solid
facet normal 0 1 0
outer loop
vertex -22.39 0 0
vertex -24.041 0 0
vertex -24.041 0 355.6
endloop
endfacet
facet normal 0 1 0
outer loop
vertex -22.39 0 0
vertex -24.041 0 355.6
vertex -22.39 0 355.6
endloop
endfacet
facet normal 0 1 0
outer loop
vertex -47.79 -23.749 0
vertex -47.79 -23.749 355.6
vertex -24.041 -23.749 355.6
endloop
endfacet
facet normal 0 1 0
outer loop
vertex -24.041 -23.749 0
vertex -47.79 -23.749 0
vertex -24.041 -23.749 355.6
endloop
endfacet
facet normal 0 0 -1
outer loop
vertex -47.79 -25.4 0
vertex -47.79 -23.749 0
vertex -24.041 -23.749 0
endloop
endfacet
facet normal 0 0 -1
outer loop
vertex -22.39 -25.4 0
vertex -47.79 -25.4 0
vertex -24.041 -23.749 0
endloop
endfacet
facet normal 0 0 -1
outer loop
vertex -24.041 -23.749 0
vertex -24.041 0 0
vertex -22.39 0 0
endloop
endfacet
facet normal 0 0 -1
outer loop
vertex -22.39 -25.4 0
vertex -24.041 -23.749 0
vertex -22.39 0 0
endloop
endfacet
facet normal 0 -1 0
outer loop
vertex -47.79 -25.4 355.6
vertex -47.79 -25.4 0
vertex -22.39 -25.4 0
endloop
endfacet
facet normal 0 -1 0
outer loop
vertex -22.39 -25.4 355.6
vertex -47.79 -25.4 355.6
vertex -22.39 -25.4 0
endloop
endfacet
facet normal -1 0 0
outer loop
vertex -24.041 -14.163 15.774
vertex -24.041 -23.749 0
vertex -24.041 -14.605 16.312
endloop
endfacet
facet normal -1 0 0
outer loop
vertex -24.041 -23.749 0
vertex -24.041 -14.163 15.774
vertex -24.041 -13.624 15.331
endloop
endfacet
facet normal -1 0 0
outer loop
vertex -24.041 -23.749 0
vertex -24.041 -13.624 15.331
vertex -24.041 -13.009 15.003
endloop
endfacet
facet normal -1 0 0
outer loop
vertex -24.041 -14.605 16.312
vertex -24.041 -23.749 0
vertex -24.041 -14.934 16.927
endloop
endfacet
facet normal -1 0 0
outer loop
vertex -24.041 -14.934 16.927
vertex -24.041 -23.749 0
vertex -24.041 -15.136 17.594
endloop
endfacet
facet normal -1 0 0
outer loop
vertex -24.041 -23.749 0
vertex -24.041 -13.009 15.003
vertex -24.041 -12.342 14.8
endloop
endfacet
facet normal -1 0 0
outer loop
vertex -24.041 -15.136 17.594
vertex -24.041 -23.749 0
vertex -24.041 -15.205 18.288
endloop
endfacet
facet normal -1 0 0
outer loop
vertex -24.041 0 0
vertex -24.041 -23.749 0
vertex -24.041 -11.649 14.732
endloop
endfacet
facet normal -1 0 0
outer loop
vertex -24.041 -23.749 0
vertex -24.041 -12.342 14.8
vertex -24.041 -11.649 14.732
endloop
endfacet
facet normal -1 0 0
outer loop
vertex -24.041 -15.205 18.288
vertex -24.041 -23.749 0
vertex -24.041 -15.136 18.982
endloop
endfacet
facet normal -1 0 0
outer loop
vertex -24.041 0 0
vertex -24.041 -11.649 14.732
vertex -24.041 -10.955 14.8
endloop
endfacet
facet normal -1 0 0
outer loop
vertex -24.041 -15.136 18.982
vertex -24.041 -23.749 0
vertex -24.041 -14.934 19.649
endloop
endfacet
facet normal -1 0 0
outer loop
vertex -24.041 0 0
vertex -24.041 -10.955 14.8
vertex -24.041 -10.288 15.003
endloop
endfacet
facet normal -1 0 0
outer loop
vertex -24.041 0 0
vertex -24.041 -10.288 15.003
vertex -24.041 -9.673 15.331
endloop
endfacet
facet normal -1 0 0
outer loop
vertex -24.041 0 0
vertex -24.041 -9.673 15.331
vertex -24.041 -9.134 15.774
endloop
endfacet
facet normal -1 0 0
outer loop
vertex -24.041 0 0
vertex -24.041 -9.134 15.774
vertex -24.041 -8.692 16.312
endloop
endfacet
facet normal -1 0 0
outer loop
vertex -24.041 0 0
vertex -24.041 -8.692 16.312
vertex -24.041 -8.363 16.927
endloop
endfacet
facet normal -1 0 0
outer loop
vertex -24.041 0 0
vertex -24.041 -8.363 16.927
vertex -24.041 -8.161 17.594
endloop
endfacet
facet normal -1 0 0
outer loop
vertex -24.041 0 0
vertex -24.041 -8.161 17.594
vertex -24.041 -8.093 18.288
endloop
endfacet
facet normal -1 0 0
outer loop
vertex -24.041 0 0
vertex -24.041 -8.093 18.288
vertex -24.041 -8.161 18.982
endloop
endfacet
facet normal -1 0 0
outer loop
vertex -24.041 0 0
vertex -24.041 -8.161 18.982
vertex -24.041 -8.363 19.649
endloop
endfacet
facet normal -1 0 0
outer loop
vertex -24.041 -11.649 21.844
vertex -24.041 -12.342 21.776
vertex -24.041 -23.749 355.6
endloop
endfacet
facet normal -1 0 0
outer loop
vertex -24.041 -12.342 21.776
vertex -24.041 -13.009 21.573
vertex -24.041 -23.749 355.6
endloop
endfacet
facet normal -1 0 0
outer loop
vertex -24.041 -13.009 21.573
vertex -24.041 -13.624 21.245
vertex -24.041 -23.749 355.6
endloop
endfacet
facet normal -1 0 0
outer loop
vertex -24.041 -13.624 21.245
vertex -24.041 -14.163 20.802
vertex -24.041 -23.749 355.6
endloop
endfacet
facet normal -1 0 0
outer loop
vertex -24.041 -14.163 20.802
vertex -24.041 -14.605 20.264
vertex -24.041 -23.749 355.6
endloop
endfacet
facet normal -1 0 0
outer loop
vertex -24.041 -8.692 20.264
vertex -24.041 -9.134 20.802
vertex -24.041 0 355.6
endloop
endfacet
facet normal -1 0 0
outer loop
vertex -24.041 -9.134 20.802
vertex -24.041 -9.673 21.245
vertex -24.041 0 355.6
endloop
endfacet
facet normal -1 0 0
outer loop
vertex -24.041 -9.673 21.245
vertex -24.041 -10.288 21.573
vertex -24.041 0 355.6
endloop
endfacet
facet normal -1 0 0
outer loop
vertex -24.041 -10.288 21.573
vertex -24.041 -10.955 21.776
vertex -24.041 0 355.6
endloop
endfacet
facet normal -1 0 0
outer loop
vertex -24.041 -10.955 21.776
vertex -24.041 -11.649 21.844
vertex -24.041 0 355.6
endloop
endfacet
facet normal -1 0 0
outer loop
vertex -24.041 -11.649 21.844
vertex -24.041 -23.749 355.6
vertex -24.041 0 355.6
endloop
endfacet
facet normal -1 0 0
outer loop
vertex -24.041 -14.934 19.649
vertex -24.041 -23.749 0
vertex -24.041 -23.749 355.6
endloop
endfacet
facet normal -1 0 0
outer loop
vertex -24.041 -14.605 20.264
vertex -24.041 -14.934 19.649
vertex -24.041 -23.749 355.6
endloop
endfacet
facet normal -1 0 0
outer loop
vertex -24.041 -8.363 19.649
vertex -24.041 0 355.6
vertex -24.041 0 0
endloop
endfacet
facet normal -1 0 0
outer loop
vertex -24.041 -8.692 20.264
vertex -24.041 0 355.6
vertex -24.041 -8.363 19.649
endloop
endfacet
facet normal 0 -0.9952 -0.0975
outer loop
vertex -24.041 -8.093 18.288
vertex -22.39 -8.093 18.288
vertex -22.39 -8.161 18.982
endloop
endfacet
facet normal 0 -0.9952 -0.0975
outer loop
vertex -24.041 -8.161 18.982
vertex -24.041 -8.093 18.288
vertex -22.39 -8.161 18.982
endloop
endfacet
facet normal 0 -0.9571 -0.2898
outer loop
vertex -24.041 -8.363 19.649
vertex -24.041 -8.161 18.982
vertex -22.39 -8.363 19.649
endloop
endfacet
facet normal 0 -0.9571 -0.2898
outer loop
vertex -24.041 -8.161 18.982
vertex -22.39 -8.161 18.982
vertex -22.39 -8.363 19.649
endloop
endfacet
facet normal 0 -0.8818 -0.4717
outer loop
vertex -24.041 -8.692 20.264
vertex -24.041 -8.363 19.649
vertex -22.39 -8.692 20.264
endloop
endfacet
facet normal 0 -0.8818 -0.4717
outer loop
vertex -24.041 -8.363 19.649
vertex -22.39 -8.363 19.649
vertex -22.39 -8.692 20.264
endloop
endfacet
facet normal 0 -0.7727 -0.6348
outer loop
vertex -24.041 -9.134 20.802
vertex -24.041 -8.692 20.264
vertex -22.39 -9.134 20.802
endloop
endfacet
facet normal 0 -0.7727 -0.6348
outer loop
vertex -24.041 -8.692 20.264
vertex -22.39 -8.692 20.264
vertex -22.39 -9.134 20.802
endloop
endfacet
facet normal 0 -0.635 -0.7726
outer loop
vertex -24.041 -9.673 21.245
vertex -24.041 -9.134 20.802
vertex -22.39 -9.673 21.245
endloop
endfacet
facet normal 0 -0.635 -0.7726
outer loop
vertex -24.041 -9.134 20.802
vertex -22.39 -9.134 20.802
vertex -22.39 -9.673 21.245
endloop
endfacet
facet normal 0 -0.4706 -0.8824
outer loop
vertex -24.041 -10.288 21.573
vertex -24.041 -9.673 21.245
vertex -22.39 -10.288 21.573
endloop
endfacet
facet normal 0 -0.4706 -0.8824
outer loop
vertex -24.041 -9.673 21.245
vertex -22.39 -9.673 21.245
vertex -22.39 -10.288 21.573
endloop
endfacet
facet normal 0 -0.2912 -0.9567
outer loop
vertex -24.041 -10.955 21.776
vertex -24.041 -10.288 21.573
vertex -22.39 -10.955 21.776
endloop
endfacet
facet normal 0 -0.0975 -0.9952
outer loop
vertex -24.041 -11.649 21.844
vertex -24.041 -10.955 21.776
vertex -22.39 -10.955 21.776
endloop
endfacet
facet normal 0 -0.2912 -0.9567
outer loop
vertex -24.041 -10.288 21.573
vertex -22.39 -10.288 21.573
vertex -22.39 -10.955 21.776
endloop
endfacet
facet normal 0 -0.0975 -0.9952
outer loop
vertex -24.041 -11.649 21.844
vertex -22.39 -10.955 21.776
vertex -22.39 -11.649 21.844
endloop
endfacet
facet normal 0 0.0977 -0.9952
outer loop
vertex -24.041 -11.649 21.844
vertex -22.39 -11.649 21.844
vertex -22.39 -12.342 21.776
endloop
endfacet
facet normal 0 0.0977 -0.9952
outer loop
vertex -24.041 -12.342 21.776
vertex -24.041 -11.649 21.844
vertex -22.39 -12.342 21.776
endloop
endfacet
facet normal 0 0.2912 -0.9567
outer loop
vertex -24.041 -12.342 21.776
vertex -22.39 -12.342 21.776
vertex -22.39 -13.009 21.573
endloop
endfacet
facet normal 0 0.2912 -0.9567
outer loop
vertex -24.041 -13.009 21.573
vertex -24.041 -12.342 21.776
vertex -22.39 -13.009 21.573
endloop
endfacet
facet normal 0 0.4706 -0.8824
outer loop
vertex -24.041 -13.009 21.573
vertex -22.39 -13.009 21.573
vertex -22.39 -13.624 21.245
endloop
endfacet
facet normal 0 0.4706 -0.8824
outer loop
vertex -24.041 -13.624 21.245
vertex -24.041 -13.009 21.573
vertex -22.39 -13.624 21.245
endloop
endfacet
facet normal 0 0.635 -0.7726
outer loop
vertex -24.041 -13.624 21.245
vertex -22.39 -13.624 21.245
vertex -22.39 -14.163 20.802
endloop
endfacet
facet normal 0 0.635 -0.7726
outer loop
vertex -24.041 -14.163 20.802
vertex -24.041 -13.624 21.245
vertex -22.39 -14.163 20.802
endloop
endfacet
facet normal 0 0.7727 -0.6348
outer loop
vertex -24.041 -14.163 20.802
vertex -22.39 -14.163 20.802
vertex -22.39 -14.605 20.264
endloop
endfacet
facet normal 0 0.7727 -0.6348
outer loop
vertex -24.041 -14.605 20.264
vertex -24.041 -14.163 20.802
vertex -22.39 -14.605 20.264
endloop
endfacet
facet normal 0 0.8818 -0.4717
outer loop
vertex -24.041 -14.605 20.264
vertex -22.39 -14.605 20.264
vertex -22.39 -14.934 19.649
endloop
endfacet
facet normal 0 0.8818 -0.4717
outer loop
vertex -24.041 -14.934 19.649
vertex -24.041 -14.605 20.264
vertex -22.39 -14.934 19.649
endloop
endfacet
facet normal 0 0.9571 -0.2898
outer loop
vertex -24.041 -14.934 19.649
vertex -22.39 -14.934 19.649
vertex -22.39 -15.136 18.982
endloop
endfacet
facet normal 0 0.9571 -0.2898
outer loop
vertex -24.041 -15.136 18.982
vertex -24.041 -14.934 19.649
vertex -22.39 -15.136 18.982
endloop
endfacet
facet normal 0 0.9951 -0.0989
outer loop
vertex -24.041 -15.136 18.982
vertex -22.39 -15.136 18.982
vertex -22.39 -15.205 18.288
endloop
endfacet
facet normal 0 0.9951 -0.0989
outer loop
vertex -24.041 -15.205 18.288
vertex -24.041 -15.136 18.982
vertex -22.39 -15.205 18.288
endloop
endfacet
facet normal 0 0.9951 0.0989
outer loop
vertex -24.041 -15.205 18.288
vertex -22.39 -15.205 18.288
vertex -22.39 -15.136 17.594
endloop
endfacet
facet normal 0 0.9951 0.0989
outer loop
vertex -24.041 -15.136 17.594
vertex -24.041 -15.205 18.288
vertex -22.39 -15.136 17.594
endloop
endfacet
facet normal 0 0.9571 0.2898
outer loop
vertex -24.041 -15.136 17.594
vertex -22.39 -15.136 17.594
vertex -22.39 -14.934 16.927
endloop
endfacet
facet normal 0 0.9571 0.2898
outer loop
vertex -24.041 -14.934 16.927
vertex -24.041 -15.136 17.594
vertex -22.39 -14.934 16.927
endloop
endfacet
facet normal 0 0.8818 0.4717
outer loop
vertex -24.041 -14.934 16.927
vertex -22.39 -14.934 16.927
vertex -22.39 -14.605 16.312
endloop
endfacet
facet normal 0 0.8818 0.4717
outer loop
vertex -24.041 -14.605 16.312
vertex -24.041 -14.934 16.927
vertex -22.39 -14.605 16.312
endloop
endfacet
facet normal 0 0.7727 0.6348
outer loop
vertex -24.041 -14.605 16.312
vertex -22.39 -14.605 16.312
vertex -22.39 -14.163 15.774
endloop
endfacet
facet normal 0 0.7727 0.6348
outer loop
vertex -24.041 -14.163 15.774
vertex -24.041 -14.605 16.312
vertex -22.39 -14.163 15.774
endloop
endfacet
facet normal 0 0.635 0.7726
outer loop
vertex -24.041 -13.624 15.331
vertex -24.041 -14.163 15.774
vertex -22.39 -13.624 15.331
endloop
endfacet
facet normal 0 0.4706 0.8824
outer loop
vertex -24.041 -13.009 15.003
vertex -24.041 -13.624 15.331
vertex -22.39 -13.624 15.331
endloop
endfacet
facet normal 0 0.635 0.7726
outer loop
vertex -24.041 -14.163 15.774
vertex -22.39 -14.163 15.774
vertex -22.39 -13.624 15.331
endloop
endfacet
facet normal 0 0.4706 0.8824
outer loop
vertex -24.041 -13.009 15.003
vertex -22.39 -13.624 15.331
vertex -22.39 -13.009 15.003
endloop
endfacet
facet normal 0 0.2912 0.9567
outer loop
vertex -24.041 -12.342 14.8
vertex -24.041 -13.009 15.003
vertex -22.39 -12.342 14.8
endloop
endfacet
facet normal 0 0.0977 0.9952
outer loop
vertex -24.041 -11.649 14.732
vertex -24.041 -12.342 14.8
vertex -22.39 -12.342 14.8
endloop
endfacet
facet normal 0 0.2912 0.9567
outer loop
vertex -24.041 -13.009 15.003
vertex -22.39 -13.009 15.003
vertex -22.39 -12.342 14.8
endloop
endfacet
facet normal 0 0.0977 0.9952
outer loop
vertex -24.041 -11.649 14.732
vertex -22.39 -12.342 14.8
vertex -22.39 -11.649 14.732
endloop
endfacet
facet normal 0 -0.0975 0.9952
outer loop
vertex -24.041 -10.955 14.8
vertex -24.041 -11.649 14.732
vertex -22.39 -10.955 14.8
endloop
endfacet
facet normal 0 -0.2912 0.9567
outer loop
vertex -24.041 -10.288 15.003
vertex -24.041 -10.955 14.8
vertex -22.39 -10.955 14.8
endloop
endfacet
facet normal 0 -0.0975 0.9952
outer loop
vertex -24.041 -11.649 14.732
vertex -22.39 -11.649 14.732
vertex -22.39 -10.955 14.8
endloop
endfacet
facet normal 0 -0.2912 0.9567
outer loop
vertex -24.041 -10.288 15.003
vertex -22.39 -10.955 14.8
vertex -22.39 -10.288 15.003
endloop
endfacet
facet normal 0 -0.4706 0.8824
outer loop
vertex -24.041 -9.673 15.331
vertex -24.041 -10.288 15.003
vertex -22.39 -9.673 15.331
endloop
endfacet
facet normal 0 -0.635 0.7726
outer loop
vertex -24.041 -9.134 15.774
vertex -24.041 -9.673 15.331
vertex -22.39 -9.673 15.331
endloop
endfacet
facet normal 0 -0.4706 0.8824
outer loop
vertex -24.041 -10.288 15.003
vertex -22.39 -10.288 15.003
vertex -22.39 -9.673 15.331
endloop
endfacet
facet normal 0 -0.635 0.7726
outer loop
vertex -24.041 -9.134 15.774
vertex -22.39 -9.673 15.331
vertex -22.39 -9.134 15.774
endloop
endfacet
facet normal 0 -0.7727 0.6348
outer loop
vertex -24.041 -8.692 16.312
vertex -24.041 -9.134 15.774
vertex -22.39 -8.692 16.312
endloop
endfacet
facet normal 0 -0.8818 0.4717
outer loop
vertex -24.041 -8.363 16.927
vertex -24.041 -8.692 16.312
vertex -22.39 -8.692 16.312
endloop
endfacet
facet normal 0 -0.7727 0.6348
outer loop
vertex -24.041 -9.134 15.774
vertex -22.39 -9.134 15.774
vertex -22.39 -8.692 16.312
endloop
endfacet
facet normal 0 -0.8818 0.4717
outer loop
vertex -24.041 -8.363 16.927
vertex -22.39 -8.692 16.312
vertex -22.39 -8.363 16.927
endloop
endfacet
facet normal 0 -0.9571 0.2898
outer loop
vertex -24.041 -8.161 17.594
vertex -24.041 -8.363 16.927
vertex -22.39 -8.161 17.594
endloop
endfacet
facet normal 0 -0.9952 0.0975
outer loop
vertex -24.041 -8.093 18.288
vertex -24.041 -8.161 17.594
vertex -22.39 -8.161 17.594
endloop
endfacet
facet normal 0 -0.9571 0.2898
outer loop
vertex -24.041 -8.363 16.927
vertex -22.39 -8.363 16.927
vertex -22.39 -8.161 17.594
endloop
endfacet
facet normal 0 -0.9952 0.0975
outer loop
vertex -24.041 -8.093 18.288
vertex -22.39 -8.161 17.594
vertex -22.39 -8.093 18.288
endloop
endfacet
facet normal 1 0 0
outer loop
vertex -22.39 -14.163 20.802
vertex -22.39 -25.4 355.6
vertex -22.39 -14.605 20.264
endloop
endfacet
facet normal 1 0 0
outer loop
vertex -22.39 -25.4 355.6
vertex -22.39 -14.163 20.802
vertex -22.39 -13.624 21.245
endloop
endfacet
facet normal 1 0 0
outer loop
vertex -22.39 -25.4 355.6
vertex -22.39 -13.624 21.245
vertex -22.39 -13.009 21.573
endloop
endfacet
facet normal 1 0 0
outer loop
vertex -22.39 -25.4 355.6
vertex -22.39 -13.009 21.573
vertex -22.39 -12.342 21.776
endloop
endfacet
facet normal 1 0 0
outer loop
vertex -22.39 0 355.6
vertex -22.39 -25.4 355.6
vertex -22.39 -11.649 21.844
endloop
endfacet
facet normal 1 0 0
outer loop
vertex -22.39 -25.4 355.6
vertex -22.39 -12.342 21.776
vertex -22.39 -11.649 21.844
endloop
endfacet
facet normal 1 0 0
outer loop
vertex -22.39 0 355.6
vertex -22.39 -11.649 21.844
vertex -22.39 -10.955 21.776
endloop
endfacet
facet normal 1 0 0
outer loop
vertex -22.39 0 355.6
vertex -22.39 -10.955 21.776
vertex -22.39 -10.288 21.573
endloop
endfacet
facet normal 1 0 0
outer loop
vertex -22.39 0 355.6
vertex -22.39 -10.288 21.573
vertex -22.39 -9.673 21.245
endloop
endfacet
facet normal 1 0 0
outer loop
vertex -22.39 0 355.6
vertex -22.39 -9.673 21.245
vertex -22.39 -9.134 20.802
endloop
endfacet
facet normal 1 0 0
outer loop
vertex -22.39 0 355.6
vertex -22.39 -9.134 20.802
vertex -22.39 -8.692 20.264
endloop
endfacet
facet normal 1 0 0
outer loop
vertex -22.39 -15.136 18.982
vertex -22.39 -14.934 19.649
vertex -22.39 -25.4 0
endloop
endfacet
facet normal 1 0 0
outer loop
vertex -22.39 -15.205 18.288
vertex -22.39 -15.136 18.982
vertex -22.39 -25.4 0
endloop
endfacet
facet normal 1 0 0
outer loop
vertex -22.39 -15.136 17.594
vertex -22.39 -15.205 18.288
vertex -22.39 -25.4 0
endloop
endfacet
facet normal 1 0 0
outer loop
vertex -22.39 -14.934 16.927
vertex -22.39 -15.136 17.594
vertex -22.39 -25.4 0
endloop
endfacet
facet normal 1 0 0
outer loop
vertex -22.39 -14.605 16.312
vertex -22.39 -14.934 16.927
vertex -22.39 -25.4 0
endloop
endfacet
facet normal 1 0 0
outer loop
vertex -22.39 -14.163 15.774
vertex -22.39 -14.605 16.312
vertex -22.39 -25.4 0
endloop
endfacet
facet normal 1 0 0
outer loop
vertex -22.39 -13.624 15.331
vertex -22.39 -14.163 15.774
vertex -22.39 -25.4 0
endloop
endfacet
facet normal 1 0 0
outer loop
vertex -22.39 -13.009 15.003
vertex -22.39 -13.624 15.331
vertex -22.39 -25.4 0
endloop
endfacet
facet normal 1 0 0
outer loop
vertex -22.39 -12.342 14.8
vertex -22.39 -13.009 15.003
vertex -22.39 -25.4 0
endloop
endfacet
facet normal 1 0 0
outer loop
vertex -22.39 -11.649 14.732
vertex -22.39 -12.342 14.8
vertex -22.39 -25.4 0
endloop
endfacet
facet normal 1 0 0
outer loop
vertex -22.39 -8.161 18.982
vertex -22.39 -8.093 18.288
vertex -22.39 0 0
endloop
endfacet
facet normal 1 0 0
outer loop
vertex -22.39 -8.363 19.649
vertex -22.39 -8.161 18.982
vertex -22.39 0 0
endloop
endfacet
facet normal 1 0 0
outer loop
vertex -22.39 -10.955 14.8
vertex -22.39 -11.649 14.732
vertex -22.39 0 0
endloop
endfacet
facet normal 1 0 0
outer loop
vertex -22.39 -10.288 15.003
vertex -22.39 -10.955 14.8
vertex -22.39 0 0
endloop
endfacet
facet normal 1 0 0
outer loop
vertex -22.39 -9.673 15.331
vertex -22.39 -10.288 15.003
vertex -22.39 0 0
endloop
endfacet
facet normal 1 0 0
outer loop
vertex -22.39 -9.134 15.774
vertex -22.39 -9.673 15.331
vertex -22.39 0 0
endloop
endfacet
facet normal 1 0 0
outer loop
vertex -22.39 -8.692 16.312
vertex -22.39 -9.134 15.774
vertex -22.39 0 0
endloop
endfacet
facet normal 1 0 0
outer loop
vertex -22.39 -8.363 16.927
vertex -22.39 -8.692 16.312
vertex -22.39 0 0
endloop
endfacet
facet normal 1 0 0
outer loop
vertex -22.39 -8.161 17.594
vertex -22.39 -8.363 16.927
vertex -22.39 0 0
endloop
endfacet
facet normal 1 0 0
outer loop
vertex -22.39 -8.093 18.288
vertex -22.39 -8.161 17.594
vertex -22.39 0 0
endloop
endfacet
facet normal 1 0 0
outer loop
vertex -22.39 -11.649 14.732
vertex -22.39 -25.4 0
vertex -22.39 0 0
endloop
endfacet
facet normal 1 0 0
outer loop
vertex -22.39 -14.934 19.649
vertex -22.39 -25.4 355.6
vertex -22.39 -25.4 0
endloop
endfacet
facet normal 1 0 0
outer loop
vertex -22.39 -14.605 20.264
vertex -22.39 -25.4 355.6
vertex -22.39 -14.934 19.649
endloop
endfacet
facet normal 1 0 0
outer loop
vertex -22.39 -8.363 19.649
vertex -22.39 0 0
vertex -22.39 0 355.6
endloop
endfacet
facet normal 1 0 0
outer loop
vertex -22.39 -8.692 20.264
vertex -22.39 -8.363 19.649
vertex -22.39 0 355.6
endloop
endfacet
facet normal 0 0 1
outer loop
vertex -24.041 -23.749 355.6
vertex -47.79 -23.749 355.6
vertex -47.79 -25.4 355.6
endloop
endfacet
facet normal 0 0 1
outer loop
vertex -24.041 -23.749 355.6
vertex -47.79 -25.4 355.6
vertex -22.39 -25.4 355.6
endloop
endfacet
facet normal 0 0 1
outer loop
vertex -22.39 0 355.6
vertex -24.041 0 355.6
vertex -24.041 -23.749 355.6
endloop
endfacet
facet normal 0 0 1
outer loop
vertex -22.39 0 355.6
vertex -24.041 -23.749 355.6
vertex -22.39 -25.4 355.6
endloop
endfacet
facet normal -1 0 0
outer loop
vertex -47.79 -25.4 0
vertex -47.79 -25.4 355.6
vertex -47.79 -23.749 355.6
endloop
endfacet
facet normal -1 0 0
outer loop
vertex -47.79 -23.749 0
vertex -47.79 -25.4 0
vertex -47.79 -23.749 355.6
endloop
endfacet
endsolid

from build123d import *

# Parameters (mm, degrees)
SKETCH1_W           = 25.4
SKETCH1_H           = 25.4
BOSS_EXTRUDE1_DEPTH = 355.6
SKETCH3_W           = 26.173809645
SKETCH3_H           = 26.478044322
CUT_EXTRUDE2_DEPTH  = 355.6
SKETCH5_R           = 3.556
CUT_EXTRUDE3_DEPTH  = 358.409680899


with BuildPart() as part:
    # Sketch1 → Boss-Extrude1 (new body)
    with BuildSketch(Plane.XY):
        with Locations((-35.089575682, -12.7)):
            Rectangle(SKETCH1_W, SKETCH1_H)
    extrude(amount=BOSS_EXTRUDE1_DEPTH)

    # Sketch3 → Cut-Extrude2 (cut)
    with BuildSketch(Plane.XY.offset(355.6)):
        with Locations((-37.127480504, -10.509977839)):
            Rectangle(SKETCH3_W, SKETCH3_H)
    extrude(amount=-CUT_EXTRUDE2_DEPTH, mode=Mode.SUBTRACT)

    # Sketch5 → Cut-Extrude3 (cut, through all)
    with BuildSketch(Plane(origin=(-22.389575682, 0, 0), x_dir=(0, 0, -1), z_dir=(1, 0, 0))):
        with Locations(Location((-18.288, -11.648501303, 0), (0, 0, 90))):
            Circle(SKETCH5_R)
    extrude(amount=-CUT_EXTRUDE3_DEPTH, mode=Mode.SUBTRACT)


solid = part.part
